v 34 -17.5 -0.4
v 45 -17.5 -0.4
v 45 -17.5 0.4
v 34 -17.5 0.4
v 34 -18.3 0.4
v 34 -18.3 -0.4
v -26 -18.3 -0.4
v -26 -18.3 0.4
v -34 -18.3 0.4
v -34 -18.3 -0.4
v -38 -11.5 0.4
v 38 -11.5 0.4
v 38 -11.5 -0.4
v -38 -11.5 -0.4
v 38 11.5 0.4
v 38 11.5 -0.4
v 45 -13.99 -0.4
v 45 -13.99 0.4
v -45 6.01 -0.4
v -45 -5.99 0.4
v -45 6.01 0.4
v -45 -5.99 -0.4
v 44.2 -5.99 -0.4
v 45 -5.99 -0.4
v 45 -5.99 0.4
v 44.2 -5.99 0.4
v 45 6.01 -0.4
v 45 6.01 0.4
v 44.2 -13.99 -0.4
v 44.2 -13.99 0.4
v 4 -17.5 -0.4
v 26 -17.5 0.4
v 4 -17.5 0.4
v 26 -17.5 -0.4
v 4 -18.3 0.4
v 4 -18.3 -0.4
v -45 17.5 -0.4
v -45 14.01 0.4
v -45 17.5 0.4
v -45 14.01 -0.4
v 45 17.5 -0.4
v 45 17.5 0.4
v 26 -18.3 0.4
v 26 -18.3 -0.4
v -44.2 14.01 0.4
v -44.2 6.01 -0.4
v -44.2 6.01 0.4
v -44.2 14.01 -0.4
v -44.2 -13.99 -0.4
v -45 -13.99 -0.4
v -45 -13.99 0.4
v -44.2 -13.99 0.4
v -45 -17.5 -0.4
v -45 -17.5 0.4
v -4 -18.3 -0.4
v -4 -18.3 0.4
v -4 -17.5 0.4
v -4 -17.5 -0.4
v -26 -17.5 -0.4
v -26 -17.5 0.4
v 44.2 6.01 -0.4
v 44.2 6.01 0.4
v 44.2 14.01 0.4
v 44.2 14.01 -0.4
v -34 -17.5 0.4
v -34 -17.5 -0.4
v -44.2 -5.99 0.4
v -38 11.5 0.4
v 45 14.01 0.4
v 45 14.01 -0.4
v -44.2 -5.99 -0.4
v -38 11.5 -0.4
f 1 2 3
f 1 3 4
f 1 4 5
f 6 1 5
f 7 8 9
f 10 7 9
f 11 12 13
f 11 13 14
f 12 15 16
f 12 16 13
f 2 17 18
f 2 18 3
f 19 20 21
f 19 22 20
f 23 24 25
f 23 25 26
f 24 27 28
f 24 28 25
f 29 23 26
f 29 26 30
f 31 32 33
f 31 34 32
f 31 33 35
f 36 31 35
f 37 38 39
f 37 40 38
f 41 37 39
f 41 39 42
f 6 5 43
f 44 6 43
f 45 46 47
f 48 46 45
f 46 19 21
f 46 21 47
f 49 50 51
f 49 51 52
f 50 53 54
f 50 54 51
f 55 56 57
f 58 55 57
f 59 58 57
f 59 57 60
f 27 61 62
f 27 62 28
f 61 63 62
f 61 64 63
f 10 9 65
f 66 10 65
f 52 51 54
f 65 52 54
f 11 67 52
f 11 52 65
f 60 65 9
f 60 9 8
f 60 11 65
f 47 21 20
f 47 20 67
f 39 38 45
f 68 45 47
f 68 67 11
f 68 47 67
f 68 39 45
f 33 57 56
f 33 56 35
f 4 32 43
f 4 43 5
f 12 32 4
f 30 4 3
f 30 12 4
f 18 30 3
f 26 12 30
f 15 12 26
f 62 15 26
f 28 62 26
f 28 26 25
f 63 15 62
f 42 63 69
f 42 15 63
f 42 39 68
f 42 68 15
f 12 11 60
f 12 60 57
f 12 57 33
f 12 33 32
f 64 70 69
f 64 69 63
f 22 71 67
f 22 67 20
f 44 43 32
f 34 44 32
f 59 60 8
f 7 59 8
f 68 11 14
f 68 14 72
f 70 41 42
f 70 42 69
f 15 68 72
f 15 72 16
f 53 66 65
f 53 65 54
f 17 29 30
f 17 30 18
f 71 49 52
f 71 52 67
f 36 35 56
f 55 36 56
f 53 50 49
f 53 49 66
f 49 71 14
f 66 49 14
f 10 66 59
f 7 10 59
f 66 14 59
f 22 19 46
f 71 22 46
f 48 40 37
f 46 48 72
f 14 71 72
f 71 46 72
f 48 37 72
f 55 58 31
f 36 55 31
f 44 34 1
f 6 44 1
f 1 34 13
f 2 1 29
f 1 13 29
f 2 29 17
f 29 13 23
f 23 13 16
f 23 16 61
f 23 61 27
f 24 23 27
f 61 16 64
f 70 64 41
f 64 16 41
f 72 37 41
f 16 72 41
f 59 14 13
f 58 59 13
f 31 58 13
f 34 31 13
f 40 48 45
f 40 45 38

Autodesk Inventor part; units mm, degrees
ref_plane "YZ Plane" through (0, 0, 0) normal (1, 0, 0) x (0, 1, 0)
ref_plane "XZ Plane" through (0, 0, 0) normal (0, 1, 0) x (-1, 0, 0)
ref_plane "XY Plane" through (0, 0, 0) normal (0, 0, 1) x (1, 0, 0)
sketch "Sketch1" plane through (0, 0, 0) normal (0, 0, 1) x (1, 0, 0)
  line L0 (0, 24.5) -> (0, -24.5) construction
  line L1 (-63, 0) -> (63, 0) construction
  line L2 (45, -17.5) -> (-45, -17.5)
  line L3 (-45, -17.5) -> (-45, 17.5)
  line L4 (-45, 17.5) -> (45, 17.5)
  line L5 (45, 17.5) -> (45, -17.5)
  line L6 (45, -17.5) -> (-45, 17.5) construction
  line L7 (-45, -17.5) -> (45, 17.5) construction
  point P0 (0, 0)
  dimension "d0" = 90
  dimension "d1" = 35
extrude "Extrusion1" add sketch "Sketch1" along normal mid plane 0.8
sketch "Esquisse2" plane through (0, 0, 0.4) normal (0, 0, 1) x (1, 0, 0)
  line L0 (-38, 11.5) -> (38, 11.5)
  line L1 (38, 11.5) -> (38, -11.5)
  line L2 (38, -11.5) -> (-38, -11.5)
  line L3 (-38, -11.5) -> (-38, 11.5)
  line L4 (-45, -17.5) -> (45, -17.5) construction
  line L5 (45, -17.5) -> (45, 17.5) construction
  line L6 (45, 17.5) -> (-45, 17.5) construction
  line L7 (-45, 17.5) -> (-45, -17.5) construction
  line L8 (0, 24.5) -> (0, -24.5) construction
  line L9 (-63, 0) -> (63, 0) construction
  point P0 (0, 0)
  dimension "d4" = 76
  dimension "d5" = 23
extrude "Extrusion2" cut sketch "Esquisse2" against normal blind 10
sketch "Esquisse4" plane through (0, 0, -0.4) normal (0, 0, -1) x (-1, 0, 0)
  line L0 (-45, 14.0096) -> (-44.2, 14.0096)
  line L1 (-44.2, 14.0096) -> (-44.2, 6.0096)
  line L2 (-44.2, 6.0096) -> (-45, 6.0096)
  line L3 (-45, 6.0096) -> (-45, 14.0096)
  line L4 (-44.2, -13.9904) -> (-45, -13.9904)
  line L5 (-45, -13.9904) -> (-45, -5.9904)
  line L6 (-45, -5.9904) -> (-44.2, -5.9904)
  line L7 (-44.2, -5.9904) -> (-44.2, -13.9904)
  line L8 (45, -13.9904) -> (44.2, -13.9904)
  line L9 (44.2, -13.9904) -> (44.2, -5.9904)
  line L10 (44.2, -5.9904) -> (45, -5.9904)
  line L11 (45, -5.9904) -> (45, -13.9904)
  line L12 (44.2, 14.0096) -> (45, 14.0096)
  line L13 (45, 14.0096) -> (45, 6.0096)
  line L14 (45, 6.0096) -> (44.2, 6.0096)
  line L15 (44.2, 6.0096) -> (44.2, 14.0096)
  point P0 (0, 0)
extrude "Extrusion4" cut sketch "Esquisse4" against normal blind 0.8
sketch "Esquisse5" plane through (0, 0, 0.4) normal (0, 0, 1) x (1, 0, 0)
  line L0 (-44.2, 14.0096) -> (-45, 14.0096) construction
  line L1 (-45, 14.0096) -> (-45, 17.5) construction
  line L2 (-45, 17.5) -> (45, 17.5) construction
  line L3 (45, 17.5) -> (45, 14.0096) construction
  line L4 (45, 14.0096) -> (44.2, 14.0096) construction
  line L5 (44.2, 14.0096) -> (44.2, 6.0096) construction
  line L6 (44.2, 6.0096) -> (45, 6.0096) construction
  line L7 (45, 6.0096) -> (45, -5.9904) construction
  line L8 (45, -5.9904) -> (44.2, -5.9904) construction
  line L9 (44.2, -5.9904) -> (44.2, -13.9904) construction
  line L10 (44.2, -13.9904) -> (45, -13.9904) construction
  line L11 (45, -13.9904) -> (45, -17.5) construction
  line L12 (45, -17.5) -> (-45, -17.5) construction
  line L13 (-45, -17.5) -> (-45, -13.9904) construction
  line L14 (-45, -13.9904) -> (-44.2, -13.9904) construction
  line L15 (-44.2, -13.9904) -> (-44.2, -5.9904) construction
  line L16 (-44.2, -5.9904) -> (-45, -5.9904) construction
  line L17 (-45, -5.9904) -> (-45, 6.0096) construction
  line L18 (-45, 6.0096) -> (-44.2, 6.0096) construction
  line L19 (-44.2, 6.0096) -> (-44.2, 14.0096) construction
  line L20 (38, -11.5) -> (38, 11.5) construction
  line L21 (38, 11.5) -> (-38, 11.5) construction
  line L22 (-38, 11.5) -> (-38, -11.5) construction
  line L23 (-38, -11.5) -> (38, -11.5) construction
  line L24 (-38, -11.5) -> (-38, 11.5) construction
  line L25 (-38, 11.5) -> (38, 11.5) construction
  line L26 (38, 11.5) -> (38, -11.5) construction
  line L27 (38, -11.5) -> (-38, -11.5) construction
  line L28 (-45, -5.9904) -> (-44.2, -5.9904) construction
  line L29 (-44.2, -5.9904) -> (-44.2, -13.9904) construction
  line L30 (-44.2, -13.9904) -> (-45, -13.9904) construction
  line L31 (-45, -13.9904) -> (-45, -17.5) construction
  line L32 (-45, -17.5) -> (45, -17.5) construction
  line L33 (45, -17.5) -> (45, -13.9904) construction
  line L34 (45, -13.9904) -> (44.2, -13.9904) construction
  line L35 (44.2, -13.9904) -> (44.2, -5.9904) construction
  line L36 (44.2, -5.9904) -> (45, -5.9904) construction
  line L37 (45, -5.9904) -> (45, 6.0096) construction
  line L38 (45, 6.0096) -> (44.2, 6.0096) construction
  line L39 (44.2, 6.0096) -> (44.2, 14.0096) construction
  line L40 (44.2, 14.0096) -> (45, 14.0096) construction
  line L41 (45, 14.0096) -> (45, 17.5) construction
  line L42 (45, 17.5) -> (-45, 17.5) construction
  line L43 (-45, 17.5) -> (-45, 14.0096) construction
  line L44 (-45, 14.0096) -> (-44.2, 14.0096) construction
  line L45 (-44.2, 14.0096) -> (-44.2, 6.0096) construction
  line L46 (-44.2, 6.0096) -> (-45, 6.0096) construction
  line L47 (-45, 6.0096) -> (-45, -5.9904) construction
  line L48 (-63, 0) -> (63, 0) construction
  line L49 (0, 24.66) -> (0, -25.46) construction
  line L50 (-34, -17.5) -> (-26, -17.5)
  line L51 (-26, -17.5) -> (-26, -18.3)
  line L52 (-26, -18.3) -> (-34, -18.3)
  line L53 (-34, -18.3) -> (-34, -17.5)
  line L54 (-4, -18.3) -> (-4, -17.5)
  line L55 (-4, -17.5) -> (4, -17.5)
  line L56 (4, -17.5) -> (4, -18.3)
  line L57 (4, -18.3) -> (-4, -18.3)
  line L58 (26, -18.3) -> (26, -17.5)
  line L59 (26, -17.5) -> (34, -17.5)
  line L60 (34, -17.5) -> (34, -18.3)
  line L61 (34, -18.3) -> (26, -18.3)
  point P0 (0, 0)
  dimension "d32" = 8
  dimension "d33" = 0.8
  dimension "d36" = 30
extrude "Extrusion5" add sketch "Esquisse5" against normal blind 0.8
properties part number "Carosserie_Capot_Avant_Haut" material "PVC-U"
